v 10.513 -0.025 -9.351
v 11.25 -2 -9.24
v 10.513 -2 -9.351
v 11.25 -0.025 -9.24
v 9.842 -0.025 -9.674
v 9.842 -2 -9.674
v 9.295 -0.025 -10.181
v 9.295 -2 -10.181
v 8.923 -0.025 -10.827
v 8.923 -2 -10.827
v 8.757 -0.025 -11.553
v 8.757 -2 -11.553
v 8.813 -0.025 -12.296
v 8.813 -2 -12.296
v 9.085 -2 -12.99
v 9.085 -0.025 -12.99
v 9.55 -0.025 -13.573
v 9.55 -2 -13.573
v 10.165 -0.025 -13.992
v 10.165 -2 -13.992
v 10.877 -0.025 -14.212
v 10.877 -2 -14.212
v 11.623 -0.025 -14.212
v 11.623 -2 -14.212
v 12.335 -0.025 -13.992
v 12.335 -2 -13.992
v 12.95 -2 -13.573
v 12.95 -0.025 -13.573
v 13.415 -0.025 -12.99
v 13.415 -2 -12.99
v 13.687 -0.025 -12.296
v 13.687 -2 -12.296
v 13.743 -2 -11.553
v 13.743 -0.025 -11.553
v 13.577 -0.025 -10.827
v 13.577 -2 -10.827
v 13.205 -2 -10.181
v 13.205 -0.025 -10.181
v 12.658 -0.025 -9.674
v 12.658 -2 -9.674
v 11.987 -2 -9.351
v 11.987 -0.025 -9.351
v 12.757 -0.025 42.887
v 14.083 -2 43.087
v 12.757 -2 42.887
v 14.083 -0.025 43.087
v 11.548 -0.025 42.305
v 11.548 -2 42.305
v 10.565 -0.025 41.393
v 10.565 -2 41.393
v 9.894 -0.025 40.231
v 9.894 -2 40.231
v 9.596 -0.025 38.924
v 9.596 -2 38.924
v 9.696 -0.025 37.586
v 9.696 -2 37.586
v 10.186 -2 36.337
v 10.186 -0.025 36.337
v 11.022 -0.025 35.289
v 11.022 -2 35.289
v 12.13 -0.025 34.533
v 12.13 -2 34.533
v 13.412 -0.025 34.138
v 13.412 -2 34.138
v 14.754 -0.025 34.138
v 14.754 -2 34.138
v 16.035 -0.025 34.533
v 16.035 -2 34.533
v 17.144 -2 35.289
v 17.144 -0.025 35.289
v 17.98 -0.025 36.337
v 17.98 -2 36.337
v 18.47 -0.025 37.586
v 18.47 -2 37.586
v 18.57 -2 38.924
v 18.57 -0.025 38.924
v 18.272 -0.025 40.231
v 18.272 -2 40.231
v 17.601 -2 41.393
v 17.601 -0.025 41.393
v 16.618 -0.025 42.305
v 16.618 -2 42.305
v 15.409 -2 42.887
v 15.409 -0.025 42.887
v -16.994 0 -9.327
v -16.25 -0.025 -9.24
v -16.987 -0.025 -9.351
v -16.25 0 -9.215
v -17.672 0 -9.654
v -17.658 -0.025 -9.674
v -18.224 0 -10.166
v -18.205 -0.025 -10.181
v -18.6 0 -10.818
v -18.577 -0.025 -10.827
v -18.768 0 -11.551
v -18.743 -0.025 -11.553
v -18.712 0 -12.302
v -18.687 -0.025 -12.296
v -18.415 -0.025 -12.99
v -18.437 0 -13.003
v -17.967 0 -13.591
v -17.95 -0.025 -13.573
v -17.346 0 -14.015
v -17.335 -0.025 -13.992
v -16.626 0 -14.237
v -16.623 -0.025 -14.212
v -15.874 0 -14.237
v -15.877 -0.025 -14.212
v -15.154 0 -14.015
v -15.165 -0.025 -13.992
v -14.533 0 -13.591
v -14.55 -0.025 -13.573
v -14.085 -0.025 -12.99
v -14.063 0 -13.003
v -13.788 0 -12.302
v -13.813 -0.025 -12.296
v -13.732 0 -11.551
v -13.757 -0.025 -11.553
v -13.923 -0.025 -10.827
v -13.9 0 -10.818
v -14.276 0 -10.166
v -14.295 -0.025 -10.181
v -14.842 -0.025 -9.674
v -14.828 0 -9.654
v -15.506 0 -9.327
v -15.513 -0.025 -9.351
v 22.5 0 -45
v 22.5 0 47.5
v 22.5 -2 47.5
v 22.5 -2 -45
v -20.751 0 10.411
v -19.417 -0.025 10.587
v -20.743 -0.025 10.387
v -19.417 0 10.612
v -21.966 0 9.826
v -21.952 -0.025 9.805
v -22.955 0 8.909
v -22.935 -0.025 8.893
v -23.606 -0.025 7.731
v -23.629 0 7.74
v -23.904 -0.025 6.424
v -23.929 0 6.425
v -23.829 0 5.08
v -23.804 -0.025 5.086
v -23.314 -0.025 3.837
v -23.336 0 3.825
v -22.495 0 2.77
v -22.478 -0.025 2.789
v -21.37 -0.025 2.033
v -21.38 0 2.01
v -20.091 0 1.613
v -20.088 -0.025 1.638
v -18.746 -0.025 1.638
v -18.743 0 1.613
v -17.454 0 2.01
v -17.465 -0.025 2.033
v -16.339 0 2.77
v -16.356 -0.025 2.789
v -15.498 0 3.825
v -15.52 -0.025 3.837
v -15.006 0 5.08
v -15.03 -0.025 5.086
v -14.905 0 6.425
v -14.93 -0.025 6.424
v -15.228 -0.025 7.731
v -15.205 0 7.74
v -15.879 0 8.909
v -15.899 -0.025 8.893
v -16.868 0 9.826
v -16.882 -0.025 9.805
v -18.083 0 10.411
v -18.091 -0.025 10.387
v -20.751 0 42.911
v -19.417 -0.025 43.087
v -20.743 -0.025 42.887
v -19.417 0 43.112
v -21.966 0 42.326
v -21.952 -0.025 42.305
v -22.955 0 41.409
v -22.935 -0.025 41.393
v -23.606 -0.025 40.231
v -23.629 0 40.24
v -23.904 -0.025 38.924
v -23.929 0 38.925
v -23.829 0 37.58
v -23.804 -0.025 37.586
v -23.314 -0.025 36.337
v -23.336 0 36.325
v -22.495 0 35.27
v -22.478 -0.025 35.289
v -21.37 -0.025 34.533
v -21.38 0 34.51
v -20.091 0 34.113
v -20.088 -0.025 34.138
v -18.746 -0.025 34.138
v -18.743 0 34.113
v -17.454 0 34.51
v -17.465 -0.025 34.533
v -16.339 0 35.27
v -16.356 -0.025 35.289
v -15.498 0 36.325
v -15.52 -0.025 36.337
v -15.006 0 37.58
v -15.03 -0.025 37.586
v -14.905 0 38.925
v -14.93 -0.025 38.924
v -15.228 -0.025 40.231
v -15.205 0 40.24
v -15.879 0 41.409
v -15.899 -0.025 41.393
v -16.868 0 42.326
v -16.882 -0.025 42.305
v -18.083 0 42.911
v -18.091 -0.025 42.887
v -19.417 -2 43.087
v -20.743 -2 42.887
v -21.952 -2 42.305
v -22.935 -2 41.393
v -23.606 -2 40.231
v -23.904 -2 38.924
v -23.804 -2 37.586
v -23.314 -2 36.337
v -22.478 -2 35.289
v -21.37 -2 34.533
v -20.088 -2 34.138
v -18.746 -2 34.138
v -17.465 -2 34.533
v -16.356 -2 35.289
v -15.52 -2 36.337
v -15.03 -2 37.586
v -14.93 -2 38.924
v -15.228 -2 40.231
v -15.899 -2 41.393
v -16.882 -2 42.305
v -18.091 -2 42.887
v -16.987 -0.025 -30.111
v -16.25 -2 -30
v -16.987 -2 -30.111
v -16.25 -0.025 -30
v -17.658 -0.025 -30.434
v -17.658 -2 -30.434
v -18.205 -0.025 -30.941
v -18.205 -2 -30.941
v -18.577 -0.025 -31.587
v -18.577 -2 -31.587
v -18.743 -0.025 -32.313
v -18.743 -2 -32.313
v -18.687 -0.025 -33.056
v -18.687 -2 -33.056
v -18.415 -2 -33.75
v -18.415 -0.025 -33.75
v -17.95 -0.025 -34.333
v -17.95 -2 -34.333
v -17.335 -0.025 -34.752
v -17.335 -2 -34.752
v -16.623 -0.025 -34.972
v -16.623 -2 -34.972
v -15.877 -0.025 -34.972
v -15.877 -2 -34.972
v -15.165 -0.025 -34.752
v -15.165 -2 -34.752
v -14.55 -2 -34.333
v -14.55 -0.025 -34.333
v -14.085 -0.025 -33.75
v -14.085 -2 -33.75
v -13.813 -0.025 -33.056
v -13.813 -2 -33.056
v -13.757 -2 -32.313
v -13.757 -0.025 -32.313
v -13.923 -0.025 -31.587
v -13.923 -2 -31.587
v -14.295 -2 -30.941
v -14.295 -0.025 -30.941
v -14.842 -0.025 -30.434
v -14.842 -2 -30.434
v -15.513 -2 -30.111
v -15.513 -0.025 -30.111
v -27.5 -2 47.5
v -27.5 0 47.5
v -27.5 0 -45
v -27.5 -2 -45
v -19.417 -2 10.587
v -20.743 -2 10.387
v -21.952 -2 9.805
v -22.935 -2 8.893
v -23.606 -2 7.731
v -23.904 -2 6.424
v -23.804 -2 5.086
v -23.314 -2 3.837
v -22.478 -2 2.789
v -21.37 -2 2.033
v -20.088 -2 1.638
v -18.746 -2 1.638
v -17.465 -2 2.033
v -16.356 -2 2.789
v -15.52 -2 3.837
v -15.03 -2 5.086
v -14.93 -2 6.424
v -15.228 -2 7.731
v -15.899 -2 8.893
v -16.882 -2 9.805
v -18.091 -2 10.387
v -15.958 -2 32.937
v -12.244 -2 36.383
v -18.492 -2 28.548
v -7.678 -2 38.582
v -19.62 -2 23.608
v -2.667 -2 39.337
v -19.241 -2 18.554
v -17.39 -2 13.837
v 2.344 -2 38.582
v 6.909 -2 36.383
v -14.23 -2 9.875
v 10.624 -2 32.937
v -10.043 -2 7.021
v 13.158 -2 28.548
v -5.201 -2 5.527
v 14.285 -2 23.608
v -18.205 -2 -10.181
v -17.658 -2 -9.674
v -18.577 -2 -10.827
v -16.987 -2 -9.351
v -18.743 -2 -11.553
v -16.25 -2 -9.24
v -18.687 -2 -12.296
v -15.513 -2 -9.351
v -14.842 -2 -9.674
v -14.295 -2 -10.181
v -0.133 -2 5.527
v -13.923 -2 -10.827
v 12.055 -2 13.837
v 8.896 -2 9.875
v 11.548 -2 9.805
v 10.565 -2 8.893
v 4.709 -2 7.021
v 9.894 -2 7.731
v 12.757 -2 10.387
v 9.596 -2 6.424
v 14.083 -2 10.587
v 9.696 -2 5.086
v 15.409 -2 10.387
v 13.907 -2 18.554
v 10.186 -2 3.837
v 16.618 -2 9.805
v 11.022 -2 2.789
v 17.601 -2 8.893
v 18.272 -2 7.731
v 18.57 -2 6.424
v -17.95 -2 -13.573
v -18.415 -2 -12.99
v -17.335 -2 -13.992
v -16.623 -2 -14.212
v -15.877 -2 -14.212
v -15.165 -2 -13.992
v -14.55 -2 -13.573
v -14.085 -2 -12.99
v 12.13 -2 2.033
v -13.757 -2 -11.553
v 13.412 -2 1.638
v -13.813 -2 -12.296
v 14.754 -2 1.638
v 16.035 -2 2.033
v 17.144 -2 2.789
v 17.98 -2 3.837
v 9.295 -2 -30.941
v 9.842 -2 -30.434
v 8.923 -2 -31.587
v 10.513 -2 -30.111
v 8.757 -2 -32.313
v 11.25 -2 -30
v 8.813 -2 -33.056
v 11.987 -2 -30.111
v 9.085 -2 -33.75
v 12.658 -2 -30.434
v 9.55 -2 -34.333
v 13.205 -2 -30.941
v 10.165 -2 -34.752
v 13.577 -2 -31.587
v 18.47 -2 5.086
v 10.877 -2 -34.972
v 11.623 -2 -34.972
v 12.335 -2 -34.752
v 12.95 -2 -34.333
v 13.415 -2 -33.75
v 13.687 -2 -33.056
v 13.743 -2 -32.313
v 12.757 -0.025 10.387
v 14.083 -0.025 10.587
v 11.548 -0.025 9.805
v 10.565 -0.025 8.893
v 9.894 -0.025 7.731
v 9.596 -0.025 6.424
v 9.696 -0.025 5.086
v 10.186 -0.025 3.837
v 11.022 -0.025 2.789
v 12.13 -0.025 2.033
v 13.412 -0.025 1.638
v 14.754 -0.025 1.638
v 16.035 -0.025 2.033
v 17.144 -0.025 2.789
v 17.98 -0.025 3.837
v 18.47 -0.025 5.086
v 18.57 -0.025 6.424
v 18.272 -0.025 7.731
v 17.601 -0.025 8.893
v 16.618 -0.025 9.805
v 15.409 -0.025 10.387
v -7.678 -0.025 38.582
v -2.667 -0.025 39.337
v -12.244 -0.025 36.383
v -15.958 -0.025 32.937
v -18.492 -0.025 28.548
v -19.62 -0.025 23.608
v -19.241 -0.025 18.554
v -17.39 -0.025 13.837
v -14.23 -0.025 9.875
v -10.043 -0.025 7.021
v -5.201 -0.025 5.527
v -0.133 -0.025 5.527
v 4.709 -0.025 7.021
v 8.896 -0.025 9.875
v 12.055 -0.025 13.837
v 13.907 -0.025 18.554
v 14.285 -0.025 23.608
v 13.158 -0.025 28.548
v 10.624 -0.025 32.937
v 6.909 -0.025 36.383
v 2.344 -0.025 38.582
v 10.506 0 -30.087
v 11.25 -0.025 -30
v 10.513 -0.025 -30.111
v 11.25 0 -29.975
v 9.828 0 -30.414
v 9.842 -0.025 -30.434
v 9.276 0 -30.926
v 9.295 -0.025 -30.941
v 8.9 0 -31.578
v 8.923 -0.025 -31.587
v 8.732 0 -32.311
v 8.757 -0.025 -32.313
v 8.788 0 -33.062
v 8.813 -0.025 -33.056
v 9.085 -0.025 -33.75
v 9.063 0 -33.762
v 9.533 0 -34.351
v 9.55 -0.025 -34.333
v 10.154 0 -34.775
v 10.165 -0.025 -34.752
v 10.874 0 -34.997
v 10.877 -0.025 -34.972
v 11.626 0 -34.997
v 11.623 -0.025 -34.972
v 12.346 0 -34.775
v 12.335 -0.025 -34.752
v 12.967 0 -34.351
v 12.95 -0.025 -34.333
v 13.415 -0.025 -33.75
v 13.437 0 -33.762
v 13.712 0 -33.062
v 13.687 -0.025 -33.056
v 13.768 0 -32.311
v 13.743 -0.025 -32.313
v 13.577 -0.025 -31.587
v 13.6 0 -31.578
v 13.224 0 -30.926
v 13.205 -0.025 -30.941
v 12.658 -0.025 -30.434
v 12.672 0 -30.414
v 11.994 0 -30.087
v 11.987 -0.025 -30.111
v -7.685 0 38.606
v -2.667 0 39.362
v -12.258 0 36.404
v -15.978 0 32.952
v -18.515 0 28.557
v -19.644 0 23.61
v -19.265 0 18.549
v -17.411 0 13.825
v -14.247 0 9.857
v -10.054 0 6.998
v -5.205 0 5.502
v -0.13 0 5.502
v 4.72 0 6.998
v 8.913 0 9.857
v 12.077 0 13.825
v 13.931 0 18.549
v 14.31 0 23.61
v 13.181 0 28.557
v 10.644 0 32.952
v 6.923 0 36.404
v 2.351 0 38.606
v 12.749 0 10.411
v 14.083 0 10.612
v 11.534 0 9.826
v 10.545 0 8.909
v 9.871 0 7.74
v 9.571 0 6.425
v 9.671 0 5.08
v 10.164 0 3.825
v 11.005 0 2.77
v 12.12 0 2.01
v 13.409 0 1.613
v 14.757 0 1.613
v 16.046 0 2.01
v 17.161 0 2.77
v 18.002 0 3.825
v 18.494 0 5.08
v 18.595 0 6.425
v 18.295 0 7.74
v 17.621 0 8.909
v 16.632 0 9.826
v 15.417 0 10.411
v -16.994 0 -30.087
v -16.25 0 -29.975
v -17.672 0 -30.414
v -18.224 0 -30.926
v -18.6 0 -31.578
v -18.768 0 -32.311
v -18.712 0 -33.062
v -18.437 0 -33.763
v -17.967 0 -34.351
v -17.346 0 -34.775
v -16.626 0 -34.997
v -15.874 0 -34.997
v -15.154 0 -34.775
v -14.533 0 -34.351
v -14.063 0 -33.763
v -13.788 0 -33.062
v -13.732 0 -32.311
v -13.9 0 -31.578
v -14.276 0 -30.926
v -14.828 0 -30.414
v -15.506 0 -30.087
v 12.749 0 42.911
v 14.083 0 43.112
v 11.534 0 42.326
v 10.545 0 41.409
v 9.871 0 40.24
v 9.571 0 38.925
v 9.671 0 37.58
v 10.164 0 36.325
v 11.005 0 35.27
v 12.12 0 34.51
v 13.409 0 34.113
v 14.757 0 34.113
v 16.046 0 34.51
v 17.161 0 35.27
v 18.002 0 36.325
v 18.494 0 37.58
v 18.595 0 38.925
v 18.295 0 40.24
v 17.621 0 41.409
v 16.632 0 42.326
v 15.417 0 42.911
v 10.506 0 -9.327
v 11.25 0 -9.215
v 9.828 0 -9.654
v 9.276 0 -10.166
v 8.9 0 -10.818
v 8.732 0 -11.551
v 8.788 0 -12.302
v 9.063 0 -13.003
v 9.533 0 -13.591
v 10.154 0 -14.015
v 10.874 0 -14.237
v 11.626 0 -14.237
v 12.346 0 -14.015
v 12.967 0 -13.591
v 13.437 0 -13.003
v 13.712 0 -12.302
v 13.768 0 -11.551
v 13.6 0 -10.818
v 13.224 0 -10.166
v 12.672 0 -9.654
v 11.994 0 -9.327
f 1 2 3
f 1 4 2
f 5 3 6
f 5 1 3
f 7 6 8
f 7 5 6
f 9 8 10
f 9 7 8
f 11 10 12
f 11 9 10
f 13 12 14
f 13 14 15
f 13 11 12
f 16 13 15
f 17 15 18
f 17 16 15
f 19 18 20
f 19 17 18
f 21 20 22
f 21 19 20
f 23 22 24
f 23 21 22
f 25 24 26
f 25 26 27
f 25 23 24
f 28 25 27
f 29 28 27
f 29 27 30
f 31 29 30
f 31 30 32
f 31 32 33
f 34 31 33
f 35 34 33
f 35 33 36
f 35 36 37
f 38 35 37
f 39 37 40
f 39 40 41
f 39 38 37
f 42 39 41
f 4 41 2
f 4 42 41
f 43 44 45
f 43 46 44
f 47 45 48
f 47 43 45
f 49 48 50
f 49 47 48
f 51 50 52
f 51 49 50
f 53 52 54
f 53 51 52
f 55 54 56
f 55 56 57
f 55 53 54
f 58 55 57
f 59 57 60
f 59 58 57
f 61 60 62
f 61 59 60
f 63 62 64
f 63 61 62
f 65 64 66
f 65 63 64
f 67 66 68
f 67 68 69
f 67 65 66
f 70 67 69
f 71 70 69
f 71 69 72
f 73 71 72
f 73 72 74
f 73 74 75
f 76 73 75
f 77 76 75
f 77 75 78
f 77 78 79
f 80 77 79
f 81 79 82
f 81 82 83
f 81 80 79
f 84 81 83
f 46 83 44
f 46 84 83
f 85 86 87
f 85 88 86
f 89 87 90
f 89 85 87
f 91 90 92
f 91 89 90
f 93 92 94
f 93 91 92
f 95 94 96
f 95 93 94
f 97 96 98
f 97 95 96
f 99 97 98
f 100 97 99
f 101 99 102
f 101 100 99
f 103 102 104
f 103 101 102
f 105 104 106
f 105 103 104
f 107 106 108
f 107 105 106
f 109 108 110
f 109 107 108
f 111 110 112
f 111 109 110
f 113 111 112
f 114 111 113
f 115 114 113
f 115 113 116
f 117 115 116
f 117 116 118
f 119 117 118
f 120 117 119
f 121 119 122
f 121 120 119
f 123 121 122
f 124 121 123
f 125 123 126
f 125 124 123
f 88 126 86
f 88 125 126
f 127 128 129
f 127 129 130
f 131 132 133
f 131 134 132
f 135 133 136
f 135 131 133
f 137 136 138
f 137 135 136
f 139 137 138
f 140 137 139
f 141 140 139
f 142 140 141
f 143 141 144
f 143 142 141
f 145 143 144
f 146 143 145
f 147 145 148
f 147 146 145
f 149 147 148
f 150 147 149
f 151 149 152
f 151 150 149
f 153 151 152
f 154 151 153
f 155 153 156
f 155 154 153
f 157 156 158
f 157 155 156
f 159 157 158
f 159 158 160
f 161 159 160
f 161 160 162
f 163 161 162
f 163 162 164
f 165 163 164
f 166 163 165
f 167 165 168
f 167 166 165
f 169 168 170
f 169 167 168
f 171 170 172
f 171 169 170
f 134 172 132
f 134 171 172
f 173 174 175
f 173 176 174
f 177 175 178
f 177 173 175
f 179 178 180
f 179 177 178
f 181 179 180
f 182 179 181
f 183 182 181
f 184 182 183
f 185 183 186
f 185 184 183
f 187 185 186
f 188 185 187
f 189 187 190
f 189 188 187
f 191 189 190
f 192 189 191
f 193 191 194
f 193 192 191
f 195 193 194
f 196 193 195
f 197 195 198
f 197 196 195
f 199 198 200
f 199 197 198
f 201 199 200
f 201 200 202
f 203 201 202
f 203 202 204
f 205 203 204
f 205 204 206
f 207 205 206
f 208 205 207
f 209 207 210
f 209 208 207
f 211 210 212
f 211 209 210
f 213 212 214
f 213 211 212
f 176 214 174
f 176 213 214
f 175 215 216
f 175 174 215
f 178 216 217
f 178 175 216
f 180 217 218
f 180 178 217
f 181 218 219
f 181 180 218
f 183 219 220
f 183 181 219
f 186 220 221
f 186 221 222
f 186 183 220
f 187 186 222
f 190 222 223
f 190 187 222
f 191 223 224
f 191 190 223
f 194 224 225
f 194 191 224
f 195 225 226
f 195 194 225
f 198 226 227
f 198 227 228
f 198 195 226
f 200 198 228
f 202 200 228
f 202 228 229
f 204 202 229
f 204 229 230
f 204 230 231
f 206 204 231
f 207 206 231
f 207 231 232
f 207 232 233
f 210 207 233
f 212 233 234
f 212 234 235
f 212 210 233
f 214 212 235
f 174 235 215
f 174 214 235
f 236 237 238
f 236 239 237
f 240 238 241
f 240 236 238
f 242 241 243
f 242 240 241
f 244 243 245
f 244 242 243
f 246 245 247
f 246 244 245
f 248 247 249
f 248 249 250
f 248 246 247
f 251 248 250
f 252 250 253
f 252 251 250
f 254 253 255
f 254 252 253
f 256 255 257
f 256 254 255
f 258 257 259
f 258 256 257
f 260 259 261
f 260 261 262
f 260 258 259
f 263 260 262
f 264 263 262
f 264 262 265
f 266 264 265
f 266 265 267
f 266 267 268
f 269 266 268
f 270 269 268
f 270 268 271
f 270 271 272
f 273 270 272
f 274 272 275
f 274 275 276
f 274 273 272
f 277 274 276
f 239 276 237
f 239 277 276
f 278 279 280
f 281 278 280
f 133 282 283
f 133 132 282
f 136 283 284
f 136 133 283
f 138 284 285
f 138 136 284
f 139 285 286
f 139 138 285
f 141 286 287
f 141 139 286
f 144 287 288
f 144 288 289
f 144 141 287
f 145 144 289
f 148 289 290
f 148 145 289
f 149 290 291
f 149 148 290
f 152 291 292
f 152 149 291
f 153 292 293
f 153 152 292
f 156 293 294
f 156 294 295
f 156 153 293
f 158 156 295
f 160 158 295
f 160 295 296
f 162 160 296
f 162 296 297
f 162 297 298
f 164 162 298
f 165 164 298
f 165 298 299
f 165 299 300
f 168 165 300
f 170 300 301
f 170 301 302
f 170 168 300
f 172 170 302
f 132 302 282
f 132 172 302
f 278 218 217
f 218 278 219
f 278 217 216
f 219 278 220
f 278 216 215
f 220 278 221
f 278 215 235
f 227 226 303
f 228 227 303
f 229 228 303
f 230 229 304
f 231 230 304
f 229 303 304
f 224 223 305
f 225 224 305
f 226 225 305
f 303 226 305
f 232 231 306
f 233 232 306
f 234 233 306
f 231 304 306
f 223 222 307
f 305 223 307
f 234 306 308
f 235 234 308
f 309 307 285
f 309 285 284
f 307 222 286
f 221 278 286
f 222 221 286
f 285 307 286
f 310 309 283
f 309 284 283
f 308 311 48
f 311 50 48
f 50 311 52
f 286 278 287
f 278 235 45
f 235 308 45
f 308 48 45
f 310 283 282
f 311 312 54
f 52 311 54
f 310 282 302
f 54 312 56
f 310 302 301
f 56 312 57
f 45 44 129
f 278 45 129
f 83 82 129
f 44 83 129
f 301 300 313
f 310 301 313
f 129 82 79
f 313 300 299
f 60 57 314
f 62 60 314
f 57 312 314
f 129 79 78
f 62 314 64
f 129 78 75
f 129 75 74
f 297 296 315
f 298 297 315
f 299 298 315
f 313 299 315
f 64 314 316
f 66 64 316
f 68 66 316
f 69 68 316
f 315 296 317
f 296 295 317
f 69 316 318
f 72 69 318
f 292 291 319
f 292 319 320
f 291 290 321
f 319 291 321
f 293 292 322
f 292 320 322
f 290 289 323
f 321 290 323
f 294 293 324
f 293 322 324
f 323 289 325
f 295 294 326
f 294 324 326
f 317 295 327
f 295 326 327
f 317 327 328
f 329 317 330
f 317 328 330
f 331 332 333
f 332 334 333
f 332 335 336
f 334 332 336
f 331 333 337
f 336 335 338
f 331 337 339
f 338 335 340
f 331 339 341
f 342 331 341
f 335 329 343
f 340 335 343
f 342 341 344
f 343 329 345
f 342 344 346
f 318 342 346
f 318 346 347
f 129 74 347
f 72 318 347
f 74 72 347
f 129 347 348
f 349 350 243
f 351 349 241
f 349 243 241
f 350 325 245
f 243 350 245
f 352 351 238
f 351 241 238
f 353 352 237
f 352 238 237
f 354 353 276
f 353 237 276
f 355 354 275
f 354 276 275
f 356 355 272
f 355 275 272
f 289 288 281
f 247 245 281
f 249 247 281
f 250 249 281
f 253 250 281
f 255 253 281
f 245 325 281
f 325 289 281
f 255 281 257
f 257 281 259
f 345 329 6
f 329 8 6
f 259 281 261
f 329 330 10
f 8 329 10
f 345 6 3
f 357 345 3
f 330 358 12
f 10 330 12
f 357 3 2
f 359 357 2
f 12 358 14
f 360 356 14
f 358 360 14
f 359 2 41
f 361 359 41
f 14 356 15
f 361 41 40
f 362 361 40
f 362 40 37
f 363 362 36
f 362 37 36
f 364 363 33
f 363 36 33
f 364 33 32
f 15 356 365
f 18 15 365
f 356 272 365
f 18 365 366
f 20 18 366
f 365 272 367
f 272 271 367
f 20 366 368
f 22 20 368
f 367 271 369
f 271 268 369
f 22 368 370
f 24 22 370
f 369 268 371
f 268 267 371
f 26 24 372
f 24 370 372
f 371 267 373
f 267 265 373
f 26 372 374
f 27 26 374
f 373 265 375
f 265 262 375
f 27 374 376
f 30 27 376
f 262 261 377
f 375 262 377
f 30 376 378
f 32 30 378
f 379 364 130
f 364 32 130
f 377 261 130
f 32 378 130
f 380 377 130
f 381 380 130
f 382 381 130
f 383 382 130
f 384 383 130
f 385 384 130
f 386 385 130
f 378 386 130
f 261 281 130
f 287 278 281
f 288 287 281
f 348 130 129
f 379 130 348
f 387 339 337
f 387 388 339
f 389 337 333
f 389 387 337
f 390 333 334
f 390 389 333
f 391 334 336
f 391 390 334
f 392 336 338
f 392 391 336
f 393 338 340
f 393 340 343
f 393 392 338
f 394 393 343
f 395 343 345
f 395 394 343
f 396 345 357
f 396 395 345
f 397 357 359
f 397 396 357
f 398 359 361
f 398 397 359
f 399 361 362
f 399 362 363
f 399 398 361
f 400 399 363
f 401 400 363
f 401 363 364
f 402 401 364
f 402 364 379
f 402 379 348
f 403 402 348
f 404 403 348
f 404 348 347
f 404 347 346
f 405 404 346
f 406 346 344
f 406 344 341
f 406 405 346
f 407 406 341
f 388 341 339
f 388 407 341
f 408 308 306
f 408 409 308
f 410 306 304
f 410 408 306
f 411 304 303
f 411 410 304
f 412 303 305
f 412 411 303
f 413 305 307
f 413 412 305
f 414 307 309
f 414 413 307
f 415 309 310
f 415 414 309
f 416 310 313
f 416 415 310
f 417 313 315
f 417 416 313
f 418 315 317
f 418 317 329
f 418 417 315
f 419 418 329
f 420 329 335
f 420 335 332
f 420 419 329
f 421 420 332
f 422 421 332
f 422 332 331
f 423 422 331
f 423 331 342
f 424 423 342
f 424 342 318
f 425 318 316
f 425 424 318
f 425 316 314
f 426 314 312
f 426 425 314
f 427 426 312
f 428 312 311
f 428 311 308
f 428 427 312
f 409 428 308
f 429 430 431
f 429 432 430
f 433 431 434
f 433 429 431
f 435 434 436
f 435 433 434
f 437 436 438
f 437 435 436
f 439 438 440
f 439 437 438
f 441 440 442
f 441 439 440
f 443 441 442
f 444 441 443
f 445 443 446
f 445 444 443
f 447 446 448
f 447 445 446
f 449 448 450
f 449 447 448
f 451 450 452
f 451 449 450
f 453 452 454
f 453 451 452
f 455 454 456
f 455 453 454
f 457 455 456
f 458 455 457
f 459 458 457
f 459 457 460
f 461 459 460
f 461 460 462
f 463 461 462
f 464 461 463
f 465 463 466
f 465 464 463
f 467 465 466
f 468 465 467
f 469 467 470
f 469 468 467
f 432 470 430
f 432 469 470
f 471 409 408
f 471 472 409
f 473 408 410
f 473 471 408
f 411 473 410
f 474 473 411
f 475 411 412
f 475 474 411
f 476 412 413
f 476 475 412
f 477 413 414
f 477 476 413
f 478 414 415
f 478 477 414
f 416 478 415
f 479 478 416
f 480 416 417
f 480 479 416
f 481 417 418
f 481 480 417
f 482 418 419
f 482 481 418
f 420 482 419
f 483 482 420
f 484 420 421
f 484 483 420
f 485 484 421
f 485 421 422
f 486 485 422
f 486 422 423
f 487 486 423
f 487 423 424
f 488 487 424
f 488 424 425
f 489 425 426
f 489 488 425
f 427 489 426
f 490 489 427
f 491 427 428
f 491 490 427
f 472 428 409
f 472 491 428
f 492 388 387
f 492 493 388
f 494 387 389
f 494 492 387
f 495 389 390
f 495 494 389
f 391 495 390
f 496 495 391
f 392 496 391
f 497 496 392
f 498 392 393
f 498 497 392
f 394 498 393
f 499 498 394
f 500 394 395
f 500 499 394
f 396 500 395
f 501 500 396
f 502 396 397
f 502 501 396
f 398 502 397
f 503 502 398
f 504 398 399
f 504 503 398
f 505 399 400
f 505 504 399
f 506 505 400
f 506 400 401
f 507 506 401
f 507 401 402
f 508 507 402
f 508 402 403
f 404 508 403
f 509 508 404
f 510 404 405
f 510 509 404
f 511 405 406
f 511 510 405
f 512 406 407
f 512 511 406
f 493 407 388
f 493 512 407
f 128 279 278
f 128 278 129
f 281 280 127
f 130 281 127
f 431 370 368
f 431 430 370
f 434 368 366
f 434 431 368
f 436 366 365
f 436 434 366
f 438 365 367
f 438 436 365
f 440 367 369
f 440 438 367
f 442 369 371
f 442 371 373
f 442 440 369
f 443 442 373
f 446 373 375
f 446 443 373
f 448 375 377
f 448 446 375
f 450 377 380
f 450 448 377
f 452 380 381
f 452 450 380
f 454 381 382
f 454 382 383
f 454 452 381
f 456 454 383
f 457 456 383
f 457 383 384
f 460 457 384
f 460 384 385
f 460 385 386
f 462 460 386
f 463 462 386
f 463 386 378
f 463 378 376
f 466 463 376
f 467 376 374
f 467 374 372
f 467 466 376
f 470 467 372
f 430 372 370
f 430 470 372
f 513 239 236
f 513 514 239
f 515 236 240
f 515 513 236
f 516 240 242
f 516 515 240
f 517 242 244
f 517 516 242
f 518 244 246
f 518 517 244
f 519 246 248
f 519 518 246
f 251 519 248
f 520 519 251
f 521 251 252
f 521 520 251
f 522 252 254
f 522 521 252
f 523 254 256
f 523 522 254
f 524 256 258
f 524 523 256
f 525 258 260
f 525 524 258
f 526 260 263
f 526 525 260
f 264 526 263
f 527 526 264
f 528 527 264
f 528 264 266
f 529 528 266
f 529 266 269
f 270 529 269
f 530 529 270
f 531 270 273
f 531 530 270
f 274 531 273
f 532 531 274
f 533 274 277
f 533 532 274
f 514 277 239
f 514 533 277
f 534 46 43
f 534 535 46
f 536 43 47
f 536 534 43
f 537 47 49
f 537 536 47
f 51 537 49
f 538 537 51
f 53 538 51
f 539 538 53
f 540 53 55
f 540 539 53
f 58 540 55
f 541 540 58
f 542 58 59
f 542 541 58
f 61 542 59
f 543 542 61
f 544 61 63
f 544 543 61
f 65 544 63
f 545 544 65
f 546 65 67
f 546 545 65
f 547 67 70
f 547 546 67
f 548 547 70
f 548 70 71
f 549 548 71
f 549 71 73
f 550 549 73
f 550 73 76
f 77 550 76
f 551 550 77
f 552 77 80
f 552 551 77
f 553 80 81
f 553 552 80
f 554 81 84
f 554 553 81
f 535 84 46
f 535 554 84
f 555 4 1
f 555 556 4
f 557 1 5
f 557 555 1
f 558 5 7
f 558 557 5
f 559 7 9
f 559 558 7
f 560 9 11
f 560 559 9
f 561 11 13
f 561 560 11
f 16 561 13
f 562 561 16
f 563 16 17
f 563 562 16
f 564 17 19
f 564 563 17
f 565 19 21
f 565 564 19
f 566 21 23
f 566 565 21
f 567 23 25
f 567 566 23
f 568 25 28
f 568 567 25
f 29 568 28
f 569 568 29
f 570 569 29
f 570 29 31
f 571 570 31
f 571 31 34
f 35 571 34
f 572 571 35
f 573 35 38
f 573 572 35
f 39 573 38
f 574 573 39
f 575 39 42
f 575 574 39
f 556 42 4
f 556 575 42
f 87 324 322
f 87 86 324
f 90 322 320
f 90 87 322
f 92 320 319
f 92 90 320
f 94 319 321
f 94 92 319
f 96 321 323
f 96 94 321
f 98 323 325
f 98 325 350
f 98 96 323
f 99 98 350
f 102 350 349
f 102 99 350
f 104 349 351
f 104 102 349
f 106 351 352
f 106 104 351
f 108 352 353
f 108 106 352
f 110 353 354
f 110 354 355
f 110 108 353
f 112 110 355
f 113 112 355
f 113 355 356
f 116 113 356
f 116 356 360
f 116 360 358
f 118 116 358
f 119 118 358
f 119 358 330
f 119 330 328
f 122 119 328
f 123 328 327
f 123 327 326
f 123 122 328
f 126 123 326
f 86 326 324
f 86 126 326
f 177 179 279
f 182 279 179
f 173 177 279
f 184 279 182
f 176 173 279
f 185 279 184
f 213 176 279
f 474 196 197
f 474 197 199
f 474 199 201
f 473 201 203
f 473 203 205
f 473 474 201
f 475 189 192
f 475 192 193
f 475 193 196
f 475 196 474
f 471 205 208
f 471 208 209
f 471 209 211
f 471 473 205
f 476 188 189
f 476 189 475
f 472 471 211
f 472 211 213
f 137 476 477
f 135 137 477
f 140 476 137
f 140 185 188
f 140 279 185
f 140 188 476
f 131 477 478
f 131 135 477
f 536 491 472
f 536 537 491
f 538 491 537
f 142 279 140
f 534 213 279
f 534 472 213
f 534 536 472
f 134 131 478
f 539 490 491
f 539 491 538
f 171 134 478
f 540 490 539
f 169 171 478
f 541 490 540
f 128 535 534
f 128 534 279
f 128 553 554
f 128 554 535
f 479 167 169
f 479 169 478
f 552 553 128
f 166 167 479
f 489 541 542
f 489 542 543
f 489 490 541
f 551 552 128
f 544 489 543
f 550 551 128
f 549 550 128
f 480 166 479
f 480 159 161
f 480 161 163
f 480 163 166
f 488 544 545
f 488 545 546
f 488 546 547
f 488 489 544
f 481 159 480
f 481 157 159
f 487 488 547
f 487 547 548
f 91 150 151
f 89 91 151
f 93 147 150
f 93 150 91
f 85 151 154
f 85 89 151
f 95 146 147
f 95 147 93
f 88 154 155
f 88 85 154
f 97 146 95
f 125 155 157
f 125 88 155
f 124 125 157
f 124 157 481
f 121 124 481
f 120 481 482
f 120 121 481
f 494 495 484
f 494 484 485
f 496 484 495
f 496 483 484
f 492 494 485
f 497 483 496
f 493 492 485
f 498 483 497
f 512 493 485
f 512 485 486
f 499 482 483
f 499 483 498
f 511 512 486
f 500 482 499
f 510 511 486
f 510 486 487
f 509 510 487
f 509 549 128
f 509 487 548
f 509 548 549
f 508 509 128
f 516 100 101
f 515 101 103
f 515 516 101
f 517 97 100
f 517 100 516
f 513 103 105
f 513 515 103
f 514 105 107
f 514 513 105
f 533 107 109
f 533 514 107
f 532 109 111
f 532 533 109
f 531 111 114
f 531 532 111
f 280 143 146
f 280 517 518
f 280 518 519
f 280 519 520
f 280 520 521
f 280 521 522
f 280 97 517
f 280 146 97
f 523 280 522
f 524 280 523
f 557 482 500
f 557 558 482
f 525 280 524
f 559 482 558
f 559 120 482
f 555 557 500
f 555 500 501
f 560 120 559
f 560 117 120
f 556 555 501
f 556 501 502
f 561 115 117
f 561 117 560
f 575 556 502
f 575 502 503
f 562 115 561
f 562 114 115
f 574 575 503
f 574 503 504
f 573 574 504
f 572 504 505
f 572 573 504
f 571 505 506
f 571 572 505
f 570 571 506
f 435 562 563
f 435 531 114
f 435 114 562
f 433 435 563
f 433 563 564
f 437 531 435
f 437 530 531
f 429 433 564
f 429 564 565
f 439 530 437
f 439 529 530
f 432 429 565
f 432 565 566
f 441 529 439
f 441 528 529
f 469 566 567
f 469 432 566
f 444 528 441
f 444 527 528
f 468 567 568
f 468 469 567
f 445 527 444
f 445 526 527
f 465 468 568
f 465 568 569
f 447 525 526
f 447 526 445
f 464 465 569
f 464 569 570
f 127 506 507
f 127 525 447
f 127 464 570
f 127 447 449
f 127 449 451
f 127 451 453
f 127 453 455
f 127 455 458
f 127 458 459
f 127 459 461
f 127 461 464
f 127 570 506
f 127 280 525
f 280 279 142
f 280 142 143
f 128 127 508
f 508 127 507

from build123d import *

# Parameters (mm, degrees)
SKETCH2_W                             = 50
SKETCH2_H                             = 92.5
BASE_FLANGE1_DEPTH                    = 2
TAP_DRILL_FOR_M6_TAP1_AT_2_COUNT      = 2
TAP_DRILL_FOR_M6_TAP1_AT_2_PITCH      = 34.456169259
TAP_DRILL_FOR_M6_TAP1_AT_3_COUNT      = 2
TAP_DRILL_FOR_M6_TAP1_AT_3_PITCH      = 27.5
TAP_DRILL_FOR_M6_TAP1_AT_4_COUNT      = 2
TAP_DRILL_FOR_M6_TAP1_AT_4_PITCH      = 20.76
TAP_DRILL_FOR_M10X1_0_TAP1_AT_2_COUNT = 2
TAP_DRILL_FOR_M10X1_0_TAP1_AT_2_PITCH = 32.5
TAP_DRILL_FOR_M10X1_0_TAP1_AT_3_COUNT = 2
TAP_DRILL_FOR_M10X1_0_TAP1_AT_3_PITCH = 46.67440412
TAP_DRILL_FOR_M10X1_0_TAP1_AT_4_COUNT = 2
TAP_DRILL_FOR_M10X1_0_TAP1_AT_4_PITCH = 33.5


# Sheet-metal steps are written as plain solids
with BuildPart() as part:
    # Sketch2 → Base-Flange1 (new body)
    with BuildSketch(Plane(origin=(0, 0, 0), x_dir=(1, 0, 0), z_dir=(0, 1, 0))):
        with Locations((-2.5, -1.25)):
            Rectangle(SKETCH2_W, SKETCH2_H)
    extrude(amount=-BASE_FLANGE1_DEPTH)

    # Sketch8 → Tap Drill for M6 Tap1 (revolve, cut)
    with BuildSketch(Plane(origin=(11.25, 0, -11.74), x_dir=(0, 0, 1), z_dir=(1, 0, 0))):
        Polygon((0, 0), (0, 2), (2.5, 2), (2.5, 0.025), (2.525, 0), align=None)
    tap_drill_for_m6_tap1 = revolve(axis=Axis((11.25, 6.35, -11.74), (0, -1, 0)), mode=Mode.SUBTRACT)

    # Tap Drill for M6 Tap1 at 2: Tap Drill for M6 Tap1 ×2
    with Locations(*[Vector(-0.7981154200092394, 0, -0.6025045861597035) * (i * TAP_DRILL_FOR_M6_TAP1_AT_2_PITCH) for i in range(1, TAP_DRILL_FOR_M6_TAP1_AT_2_COUNT)]):
        add(tap_drill_for_m6_tap1, mode=Mode.SUBTRACT)

    # Tap Drill for M6 Tap1 at 3: Tap Drill for M6 Tap1 ×2
    with Locations(*[(-i * TAP_DRILL_FOR_M6_TAP1_AT_3_PITCH, 0, 0) for i in range(1, TAP_DRILL_FOR_M6_TAP1_AT_3_COUNT)]):
        add(tap_drill_for_m6_tap1, mode=Mode.SUBTRACT)

    # Tap Drill for M6 Tap1 at 4: Tap Drill for M6 Tap1 ×2
    with Locations(*[(0, 0, -i * TAP_DRILL_FOR_M6_TAP1_AT_4_PITCH) for i in range(1, TAP_DRILL_FOR_M6_TAP1_AT_4_COUNT)]):
        add(tap_drill_for_m6_tap1, mode=Mode.SUBTRACT)

    # Sketch15 → Tap Drill for M10x1.0 Tap1 (revolve, cut)
    with BuildSketch(Plane(origin=(-19.417070164, 0, 6.087287234), x_dir=(0, 0, 1), z_dir=(1, 0, 0))):
        Polygon((0, 0), (0, 2), (4.5, 2), (4.5, 0.025), (4.525, 0), align=None)
    tap_drill_for_m10x1_0_tap1 = revolve(axis=Axis((-19.417070164, 6.35, 6.087287234), (0, -1, 0)), mode=Mode.SUBTRACT)

    # Tap Drill for M10x1.0 Tap1 at 2: Tap Drill for M10x1.0 Tap1 ×2
    with Locations(*[(0, 0, i * TAP_DRILL_FOR_M10X1_0_TAP1_AT_2_PITCH) for i in range(1, TAP_DRILL_FOR_M10X1_0_TAP1_AT_2_COUNT)]):
        add(tap_drill_for_m10x1_0_tap1, mode=Mode.SUBTRACT)

    # Tap Drill for M10x1.0 Tap1 at 3: Tap Drill for M10x1.0 Tap1 ×2
    with Locations(*[Vector(0.7177381400208425, 0, 0.6963131209157426) * (i * TAP_DRILL_FOR_M10X1_0_TAP1_AT_3_PITCH) for i in range(1, TAP_DRILL_FOR_M10X1_0_TAP1_AT_3_COUNT)]):
        add(tap_drill_for_m10x1_0_tap1, mode=Mode.SUBTRACT)

    # Tap Drill for M10x1.0 Tap1 at 4: Tap Drill for M10x1.0 Tap1 ×2
    with Locations(*[(i * TAP_DRILL_FOR_M10X1_0_TAP1_AT_4_PITCH, 0, 0) for i in range(1, TAP_DRILL_FOR_M10X1_0_TAP1_AT_4_COUNT)]):
        add(tap_drill_for_m10x1_0_tap1, mode=Mode.SUBTRACT)

    # Sketch18 → Tap Drill for M36x2.0 Tap1 (revolve, cut)
    with BuildSketch(Plane(origin=(-2.667070164, 0, 22.337287234), x_dir=(0, 0, 1), z_dir=(1, 0, 0))):
        Polygon((0, 0), (0, 2), (17, 2), (17, 0.025), (17.025, 0), align=None)
    revolve(axis=Axis((-2.667070164, 6.35, 22.337287234), (0, -1, 0)), mode=Mode.SUBTRACT)


solid = part.part
